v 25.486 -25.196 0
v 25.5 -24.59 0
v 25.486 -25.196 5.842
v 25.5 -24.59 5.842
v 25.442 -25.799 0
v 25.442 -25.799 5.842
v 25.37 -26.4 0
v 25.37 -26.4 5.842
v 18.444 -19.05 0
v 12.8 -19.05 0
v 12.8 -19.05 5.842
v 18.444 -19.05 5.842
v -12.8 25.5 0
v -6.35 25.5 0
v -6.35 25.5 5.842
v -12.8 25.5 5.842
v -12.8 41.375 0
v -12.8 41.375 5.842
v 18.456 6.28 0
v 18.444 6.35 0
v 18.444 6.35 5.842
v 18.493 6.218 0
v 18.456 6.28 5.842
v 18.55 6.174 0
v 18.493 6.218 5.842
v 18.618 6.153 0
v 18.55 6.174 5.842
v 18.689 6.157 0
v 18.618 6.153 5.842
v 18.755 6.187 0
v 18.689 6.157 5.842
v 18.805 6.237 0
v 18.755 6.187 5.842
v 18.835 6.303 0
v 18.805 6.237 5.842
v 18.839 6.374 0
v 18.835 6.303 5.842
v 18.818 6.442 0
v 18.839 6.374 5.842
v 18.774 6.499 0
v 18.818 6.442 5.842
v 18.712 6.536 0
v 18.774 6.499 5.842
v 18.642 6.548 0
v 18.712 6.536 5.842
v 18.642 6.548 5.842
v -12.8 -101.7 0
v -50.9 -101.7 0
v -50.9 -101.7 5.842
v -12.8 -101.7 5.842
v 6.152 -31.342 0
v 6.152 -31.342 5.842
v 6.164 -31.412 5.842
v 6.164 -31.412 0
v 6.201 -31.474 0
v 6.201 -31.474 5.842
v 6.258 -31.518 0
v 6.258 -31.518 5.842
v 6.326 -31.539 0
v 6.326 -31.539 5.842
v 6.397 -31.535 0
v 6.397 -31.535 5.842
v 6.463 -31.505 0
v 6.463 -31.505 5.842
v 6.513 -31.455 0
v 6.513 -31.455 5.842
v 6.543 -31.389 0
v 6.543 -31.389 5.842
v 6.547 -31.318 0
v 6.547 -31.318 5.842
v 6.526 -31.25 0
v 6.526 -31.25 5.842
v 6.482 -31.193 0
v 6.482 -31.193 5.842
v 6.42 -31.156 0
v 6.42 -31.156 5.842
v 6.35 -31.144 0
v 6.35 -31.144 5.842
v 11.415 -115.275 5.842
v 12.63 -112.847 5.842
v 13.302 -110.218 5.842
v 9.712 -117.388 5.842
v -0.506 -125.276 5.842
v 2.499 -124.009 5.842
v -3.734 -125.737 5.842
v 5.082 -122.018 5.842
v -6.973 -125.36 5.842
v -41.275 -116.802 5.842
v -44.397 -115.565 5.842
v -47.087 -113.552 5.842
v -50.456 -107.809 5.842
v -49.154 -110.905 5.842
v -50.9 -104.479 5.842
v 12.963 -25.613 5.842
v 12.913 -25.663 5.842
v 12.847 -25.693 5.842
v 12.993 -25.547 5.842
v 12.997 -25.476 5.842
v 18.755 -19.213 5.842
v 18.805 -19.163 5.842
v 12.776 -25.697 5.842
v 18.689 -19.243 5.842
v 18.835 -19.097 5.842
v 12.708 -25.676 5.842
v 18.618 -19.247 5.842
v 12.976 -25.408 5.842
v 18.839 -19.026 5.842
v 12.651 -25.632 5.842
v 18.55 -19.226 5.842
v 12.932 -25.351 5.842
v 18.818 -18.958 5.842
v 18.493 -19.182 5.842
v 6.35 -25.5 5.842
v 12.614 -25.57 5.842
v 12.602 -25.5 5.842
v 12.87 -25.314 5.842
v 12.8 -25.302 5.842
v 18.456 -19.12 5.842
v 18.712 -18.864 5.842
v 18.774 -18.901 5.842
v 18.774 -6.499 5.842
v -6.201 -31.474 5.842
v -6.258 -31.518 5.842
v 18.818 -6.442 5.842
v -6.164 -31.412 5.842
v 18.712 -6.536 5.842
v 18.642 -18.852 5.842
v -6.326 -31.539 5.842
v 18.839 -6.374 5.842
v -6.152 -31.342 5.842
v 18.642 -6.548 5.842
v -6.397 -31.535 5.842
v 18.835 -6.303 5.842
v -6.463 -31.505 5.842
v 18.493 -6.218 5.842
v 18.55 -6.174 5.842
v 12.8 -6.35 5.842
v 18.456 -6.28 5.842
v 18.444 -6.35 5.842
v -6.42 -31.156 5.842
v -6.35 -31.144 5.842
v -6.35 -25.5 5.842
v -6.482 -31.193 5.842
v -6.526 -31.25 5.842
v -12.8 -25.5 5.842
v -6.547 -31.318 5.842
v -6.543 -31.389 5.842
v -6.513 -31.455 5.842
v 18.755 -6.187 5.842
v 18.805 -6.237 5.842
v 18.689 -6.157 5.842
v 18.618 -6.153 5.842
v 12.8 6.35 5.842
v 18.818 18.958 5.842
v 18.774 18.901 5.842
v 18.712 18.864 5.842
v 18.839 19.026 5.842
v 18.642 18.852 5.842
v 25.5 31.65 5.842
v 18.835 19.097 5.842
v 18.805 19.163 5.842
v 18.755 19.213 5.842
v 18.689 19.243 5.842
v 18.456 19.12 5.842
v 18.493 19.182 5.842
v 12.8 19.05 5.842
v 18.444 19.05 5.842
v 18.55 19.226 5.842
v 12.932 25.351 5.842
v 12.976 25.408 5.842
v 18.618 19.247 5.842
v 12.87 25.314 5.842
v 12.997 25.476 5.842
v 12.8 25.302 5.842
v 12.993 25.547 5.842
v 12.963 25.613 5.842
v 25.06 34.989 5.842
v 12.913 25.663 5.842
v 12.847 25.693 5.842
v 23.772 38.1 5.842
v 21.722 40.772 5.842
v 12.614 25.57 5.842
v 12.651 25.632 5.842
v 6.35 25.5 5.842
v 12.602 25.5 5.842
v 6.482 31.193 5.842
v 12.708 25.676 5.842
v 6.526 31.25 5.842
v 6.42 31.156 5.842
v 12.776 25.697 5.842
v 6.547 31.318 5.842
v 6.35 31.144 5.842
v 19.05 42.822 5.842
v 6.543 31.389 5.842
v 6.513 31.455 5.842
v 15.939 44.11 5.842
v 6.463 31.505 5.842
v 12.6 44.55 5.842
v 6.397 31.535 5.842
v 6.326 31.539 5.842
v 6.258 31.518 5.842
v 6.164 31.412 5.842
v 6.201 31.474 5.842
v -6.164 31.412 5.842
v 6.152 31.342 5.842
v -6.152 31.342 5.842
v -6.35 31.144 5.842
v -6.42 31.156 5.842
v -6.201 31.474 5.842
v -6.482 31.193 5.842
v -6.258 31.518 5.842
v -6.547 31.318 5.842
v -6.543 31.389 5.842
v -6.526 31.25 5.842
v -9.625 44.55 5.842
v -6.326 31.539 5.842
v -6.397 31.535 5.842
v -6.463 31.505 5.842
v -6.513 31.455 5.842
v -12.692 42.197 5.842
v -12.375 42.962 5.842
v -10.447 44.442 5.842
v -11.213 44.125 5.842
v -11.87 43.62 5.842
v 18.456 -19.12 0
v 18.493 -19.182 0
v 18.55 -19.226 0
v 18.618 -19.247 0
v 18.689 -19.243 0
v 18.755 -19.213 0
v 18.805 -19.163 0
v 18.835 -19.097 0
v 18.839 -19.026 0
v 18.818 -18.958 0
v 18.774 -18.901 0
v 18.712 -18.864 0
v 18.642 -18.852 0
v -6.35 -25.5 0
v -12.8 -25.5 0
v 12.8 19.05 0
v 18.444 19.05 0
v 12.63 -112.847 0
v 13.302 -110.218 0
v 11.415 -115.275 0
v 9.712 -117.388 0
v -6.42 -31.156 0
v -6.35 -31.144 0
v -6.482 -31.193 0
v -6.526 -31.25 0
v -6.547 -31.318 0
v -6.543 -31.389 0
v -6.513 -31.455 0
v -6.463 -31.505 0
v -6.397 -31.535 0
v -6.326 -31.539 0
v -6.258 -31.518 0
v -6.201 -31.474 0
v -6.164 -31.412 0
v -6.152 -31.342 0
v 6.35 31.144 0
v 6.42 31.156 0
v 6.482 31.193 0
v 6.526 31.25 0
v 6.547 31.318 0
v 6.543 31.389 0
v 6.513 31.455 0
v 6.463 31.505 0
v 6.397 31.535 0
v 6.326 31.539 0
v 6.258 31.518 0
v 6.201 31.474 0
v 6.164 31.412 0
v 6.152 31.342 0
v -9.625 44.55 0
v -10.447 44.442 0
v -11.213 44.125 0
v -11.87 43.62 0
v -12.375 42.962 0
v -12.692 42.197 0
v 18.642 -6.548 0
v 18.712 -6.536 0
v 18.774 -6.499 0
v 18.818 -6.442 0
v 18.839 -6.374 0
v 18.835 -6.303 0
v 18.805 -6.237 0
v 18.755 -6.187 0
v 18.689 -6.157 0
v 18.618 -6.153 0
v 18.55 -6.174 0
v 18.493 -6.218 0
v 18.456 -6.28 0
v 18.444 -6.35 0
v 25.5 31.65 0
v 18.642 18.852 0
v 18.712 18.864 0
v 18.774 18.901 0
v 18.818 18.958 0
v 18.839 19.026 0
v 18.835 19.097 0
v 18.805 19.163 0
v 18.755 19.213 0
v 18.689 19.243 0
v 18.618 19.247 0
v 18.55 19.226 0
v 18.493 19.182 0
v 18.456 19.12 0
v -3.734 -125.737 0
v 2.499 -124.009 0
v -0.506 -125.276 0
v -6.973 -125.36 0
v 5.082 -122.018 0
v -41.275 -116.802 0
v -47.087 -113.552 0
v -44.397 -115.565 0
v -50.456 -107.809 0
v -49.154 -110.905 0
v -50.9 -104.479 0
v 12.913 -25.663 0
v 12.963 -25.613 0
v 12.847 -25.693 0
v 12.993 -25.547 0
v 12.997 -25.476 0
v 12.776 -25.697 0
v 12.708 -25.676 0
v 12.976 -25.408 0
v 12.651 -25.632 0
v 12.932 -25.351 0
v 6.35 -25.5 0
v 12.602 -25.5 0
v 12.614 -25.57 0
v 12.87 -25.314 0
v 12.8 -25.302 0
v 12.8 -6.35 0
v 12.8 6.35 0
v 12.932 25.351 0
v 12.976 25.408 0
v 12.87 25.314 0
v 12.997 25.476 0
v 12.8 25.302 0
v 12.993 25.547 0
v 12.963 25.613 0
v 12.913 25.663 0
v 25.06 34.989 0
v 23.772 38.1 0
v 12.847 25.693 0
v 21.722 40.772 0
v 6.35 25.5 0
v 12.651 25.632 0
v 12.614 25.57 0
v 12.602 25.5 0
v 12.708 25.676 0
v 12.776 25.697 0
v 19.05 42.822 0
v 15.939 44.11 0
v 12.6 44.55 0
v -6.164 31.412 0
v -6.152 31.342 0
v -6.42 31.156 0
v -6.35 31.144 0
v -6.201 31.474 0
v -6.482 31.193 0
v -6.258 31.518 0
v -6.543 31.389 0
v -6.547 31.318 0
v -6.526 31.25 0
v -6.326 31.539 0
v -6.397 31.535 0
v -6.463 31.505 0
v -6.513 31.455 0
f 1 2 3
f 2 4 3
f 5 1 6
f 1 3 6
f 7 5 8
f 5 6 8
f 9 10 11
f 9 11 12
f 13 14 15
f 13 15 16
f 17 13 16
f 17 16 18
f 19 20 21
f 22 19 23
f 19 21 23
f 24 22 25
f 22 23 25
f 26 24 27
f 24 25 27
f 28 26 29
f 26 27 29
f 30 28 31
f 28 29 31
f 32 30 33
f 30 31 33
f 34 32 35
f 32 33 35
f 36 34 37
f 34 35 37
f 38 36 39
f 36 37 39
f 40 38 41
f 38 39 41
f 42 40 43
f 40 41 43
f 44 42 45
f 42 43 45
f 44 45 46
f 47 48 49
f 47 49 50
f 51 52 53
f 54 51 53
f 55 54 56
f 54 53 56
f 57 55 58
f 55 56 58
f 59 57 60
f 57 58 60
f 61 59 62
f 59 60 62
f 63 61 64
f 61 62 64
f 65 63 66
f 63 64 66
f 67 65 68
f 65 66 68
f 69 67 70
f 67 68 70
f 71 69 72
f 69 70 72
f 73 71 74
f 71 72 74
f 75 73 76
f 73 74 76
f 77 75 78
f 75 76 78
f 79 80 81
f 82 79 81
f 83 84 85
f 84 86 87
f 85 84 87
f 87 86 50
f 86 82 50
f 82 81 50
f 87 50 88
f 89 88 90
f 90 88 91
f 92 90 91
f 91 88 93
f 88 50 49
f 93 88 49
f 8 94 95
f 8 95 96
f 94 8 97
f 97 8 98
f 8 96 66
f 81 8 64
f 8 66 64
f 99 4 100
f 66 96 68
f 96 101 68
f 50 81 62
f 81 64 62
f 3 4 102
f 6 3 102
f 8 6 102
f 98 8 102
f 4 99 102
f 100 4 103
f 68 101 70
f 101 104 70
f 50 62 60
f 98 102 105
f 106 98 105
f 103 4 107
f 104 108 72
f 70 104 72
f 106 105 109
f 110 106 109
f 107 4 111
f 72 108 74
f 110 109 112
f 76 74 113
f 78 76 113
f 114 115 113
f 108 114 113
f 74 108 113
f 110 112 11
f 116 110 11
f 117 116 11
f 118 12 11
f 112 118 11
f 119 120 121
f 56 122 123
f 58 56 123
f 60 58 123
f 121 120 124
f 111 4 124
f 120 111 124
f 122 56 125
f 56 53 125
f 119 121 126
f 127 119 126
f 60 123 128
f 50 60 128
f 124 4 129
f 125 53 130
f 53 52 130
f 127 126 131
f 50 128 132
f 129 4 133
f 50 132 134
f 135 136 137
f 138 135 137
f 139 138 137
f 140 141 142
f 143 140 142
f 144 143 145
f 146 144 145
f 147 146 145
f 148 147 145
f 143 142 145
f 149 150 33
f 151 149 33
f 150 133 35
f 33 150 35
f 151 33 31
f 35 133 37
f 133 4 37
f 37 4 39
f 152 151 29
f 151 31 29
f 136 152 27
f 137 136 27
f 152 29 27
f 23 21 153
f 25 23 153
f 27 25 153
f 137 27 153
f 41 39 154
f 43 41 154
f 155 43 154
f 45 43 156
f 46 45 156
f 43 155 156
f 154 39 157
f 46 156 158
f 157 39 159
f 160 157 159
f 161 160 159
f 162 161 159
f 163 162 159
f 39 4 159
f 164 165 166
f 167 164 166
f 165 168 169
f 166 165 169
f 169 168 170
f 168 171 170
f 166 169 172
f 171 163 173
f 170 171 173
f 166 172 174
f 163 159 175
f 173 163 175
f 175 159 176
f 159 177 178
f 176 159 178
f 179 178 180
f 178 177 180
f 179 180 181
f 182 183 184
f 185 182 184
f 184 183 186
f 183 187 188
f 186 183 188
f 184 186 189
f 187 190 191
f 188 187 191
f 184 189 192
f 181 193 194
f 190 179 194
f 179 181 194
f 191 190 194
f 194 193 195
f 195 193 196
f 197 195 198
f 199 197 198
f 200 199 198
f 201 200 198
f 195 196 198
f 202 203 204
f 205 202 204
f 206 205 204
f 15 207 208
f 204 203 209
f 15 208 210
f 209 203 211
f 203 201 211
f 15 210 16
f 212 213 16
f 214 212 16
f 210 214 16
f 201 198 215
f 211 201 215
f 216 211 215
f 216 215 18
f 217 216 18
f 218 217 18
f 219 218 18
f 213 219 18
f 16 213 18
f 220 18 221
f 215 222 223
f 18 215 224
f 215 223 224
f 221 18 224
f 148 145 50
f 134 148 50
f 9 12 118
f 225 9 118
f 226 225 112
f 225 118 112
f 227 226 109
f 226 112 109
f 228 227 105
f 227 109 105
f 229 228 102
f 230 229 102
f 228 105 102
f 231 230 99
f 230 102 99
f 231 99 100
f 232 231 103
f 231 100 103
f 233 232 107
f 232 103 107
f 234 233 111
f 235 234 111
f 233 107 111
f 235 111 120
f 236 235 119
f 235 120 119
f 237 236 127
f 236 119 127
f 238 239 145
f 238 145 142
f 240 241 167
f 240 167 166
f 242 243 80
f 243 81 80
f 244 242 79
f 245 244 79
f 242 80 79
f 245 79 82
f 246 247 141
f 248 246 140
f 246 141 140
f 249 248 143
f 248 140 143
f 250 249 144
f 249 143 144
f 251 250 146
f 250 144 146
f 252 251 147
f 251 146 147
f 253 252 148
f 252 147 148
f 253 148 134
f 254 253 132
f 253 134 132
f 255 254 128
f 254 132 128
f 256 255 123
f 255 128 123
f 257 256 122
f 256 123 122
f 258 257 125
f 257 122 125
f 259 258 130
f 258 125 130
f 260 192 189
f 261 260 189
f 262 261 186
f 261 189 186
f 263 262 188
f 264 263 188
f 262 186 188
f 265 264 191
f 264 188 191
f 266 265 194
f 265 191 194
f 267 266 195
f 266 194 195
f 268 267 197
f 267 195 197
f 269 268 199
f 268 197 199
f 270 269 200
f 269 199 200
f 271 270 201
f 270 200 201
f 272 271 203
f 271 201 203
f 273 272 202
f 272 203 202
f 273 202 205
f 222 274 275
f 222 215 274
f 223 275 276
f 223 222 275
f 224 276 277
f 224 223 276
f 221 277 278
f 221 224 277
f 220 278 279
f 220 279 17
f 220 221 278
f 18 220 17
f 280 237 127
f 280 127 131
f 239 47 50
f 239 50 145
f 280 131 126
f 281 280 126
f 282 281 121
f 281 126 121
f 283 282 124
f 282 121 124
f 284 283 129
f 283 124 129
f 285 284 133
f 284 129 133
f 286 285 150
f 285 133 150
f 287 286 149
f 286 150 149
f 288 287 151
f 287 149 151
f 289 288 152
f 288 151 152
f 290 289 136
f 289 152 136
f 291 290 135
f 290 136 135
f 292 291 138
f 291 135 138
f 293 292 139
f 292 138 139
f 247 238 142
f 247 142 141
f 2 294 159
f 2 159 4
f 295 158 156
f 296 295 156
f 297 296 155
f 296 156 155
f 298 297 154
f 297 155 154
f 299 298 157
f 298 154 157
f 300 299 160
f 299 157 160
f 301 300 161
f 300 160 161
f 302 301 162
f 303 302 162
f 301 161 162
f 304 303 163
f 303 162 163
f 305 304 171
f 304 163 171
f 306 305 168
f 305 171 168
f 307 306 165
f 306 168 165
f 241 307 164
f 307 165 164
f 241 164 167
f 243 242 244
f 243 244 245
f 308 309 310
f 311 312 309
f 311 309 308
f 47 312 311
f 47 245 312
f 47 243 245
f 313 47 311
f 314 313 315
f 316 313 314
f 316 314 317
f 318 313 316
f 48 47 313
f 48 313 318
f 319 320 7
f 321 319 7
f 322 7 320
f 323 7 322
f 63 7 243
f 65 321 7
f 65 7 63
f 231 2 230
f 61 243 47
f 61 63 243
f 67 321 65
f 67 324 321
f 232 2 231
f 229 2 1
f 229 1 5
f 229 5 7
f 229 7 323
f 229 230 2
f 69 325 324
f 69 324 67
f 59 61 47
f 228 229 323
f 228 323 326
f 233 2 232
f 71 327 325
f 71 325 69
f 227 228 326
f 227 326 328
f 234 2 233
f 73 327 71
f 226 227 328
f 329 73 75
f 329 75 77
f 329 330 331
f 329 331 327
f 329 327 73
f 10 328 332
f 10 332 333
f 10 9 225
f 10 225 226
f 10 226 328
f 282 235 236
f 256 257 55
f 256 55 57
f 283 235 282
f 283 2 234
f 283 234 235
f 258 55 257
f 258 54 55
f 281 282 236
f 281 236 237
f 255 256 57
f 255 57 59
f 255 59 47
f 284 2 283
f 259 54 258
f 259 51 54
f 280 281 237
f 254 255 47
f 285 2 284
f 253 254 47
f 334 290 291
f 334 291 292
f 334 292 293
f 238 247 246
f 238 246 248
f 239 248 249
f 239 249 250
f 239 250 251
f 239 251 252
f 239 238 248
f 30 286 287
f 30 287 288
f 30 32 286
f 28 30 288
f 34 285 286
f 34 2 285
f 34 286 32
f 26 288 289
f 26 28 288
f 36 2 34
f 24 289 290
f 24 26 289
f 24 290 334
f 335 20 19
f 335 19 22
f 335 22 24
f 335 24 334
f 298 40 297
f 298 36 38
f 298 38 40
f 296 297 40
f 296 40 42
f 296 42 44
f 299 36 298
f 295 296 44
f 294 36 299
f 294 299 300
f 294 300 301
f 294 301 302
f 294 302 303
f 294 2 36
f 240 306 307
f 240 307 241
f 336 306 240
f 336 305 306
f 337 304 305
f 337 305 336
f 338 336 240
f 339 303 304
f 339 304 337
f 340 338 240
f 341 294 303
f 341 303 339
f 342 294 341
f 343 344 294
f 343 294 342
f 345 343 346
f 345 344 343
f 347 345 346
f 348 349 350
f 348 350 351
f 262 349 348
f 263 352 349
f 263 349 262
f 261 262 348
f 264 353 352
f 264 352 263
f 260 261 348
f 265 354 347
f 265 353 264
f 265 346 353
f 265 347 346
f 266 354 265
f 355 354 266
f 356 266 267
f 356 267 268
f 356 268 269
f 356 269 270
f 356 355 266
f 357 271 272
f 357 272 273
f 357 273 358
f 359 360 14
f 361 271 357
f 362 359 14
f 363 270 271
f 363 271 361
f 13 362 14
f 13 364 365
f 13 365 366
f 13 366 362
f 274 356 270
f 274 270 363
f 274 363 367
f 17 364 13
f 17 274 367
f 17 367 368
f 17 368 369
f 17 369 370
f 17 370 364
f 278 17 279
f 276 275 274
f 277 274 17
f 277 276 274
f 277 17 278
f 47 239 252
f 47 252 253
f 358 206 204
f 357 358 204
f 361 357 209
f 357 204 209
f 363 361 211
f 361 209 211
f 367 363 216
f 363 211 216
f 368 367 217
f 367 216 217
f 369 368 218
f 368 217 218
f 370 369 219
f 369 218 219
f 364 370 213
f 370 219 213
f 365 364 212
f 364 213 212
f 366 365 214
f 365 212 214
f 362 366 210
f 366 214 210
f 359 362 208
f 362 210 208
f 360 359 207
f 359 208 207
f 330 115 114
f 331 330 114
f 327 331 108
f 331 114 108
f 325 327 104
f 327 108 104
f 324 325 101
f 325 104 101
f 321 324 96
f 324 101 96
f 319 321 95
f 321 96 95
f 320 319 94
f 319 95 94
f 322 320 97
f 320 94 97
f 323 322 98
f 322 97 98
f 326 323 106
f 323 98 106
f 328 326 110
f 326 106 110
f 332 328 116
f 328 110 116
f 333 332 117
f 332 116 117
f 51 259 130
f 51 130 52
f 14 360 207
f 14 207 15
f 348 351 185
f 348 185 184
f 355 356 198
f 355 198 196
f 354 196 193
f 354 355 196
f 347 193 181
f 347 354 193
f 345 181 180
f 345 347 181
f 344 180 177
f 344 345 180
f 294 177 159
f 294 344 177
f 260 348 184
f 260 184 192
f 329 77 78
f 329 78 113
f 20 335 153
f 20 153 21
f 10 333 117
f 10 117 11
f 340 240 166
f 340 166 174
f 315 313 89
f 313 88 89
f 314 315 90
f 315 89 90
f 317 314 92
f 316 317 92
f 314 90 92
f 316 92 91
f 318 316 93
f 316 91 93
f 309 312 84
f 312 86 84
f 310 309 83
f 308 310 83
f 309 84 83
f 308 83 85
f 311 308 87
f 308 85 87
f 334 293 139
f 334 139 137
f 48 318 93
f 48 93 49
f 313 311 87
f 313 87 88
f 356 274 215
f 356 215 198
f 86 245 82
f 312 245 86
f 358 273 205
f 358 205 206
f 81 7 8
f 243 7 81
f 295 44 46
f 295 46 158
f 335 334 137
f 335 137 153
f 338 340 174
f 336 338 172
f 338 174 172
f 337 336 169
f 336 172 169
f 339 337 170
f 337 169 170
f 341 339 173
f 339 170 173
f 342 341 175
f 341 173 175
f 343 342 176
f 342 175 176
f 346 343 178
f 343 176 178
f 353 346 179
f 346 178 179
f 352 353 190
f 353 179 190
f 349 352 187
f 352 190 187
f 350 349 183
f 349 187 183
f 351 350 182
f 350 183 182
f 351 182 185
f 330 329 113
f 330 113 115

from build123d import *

# Parameters (mm, degrees)
BOSS_EXTRUDE1_DEPTH = 5.842
FILLET1_R           = 12.7
FILLET2_R           = 3.175
SKETCH2_R           = 0.1984375
CUT_EXTRUDE1_DEPTH  = 136.775443647


with BuildPart() as part:
    # Sketch1 → Boss-Extrude1 (new body)
    with BuildSketch(Plane.XY):
        with BuildLine():
            Line((-12.8, -25.5), (-6.35, -25.5))
            Line((-6.35, -25.5), (-6.35, -31.342))
            Line((-6.35, -31.342), (6.35, -31.342))
            Line((6.35, -31.342), (6.35, -25.5))
            Line((6.35, -25.5), (12.8, -25.5))
            Line((12.8, -25.5), (12.8, -19.05))
            Line((12.8, -19.05), (18.642, -19.05))
            Line((18.642, -19.05), (18.642, -6.35))
            Line((18.642, -6.35), (12.8, -6.35))
            Line((12.8, -6.35), (12.8, 6.35))
            Line((12.8, 6.35), (18.642, 6.35))
            Line((18.642, 6.35), (18.642, 19.05))
            Line((18.642, 19.05), (12.8, 19.05))
            Line((12.8, 19.05), (12.8, 25.5))
            Line((12.8, 25.5), (6.35, 25.5))
            Line((6.35, 25.5), (6.35, 31.342))
            Line((6.35, 31.342), (-6.35, 31.342))
            Line((-6.35, 31.342), (-6.35, 25.5))
            Line((-6.35, 25.5), (-12.8, 25.5))
            Line((-12.8, 25.5), (-12.8, 44.55))
            Line((-12.8, 44.55), (12.6, 44.55))
            ThreePointArc((12.6, 44.55), (21.721677477, 40.771677477), (25.5, 31.65))
            Line((25.5, 31.65), (25.5, 25.3))
            Line((25.5, 25.3), (25.5, -25.5))
            Line((25.5, -25.5), (12.7, -114.4))
            Line((12.7, -114.4), (0, -127.1))
            Line((0, -127.1), (-50.9, -114.4))
            Line((-50.9, -114.4), (-50.9, -101.7))
            Line((-50.9, -101.7), (-12.8, -101.7))
            Line((-12.8, -101.7), (-12.8, -25.5))
        make_face()
    extrude(amount=BOSS_EXTRUDE1_DEPTH)

    # Fillet1
    fillet1_edges = [part.edges().sort_by_distance(p)[0] for p in [
        (25.5, -25.5, 2.921),
        (12.7, -114.4, 2.921),
        (0, -127.1, 2.921),
        (-50.9, -114.4, 2.921),
    ]]
    fillet(fillet1_edges, radius=FILLET1_R)

    # Fillet2
    fillet2_edges = [part.edges().sort_by_distance(p)[0] for p in [
        (-12.8, 44.55, 2.921),
    ]]
    fillet(fillet2_edges, radius=FILLET2_R)

    # Sketch2 → Cut-Extrude1 (cut, through all)
    with BuildSketch(Plane.XY.offset(5.842)):
        with Locations((-6.35, 31.342)):
            Circle(SKETCH2_R)
        with Locations((6.35, 31.342)):
            Circle(SKETCH2_R)
        with Locations((18.642, 19.05)):
            Circle(SKETCH2_R)
        with Locations((12.8, 25.5)):
            Circle(SKETCH2_R)
        with Locations((18.642, 6.35)):
            Circle(SKETCH2_R)
        with Locations((18.642, -6.35)):
            Circle(SKETCH2_R)
        with Locations((12.8, -25.5)):
            Circle(SKETCH2_R)
        with Locations((18.642, -19.05)):
            Circle(SKETCH2_R)
        with Locations((6.35, -31.342)):
            Circle(SKETCH2_R)
        with Locations((-6.35, -31.342)):
            Circle(SKETCH2_R)
    extrude(amount=-CUT_EXTRUDE1_DEPTH, mode=Mode.SUBTRACT)


solid = part.part
